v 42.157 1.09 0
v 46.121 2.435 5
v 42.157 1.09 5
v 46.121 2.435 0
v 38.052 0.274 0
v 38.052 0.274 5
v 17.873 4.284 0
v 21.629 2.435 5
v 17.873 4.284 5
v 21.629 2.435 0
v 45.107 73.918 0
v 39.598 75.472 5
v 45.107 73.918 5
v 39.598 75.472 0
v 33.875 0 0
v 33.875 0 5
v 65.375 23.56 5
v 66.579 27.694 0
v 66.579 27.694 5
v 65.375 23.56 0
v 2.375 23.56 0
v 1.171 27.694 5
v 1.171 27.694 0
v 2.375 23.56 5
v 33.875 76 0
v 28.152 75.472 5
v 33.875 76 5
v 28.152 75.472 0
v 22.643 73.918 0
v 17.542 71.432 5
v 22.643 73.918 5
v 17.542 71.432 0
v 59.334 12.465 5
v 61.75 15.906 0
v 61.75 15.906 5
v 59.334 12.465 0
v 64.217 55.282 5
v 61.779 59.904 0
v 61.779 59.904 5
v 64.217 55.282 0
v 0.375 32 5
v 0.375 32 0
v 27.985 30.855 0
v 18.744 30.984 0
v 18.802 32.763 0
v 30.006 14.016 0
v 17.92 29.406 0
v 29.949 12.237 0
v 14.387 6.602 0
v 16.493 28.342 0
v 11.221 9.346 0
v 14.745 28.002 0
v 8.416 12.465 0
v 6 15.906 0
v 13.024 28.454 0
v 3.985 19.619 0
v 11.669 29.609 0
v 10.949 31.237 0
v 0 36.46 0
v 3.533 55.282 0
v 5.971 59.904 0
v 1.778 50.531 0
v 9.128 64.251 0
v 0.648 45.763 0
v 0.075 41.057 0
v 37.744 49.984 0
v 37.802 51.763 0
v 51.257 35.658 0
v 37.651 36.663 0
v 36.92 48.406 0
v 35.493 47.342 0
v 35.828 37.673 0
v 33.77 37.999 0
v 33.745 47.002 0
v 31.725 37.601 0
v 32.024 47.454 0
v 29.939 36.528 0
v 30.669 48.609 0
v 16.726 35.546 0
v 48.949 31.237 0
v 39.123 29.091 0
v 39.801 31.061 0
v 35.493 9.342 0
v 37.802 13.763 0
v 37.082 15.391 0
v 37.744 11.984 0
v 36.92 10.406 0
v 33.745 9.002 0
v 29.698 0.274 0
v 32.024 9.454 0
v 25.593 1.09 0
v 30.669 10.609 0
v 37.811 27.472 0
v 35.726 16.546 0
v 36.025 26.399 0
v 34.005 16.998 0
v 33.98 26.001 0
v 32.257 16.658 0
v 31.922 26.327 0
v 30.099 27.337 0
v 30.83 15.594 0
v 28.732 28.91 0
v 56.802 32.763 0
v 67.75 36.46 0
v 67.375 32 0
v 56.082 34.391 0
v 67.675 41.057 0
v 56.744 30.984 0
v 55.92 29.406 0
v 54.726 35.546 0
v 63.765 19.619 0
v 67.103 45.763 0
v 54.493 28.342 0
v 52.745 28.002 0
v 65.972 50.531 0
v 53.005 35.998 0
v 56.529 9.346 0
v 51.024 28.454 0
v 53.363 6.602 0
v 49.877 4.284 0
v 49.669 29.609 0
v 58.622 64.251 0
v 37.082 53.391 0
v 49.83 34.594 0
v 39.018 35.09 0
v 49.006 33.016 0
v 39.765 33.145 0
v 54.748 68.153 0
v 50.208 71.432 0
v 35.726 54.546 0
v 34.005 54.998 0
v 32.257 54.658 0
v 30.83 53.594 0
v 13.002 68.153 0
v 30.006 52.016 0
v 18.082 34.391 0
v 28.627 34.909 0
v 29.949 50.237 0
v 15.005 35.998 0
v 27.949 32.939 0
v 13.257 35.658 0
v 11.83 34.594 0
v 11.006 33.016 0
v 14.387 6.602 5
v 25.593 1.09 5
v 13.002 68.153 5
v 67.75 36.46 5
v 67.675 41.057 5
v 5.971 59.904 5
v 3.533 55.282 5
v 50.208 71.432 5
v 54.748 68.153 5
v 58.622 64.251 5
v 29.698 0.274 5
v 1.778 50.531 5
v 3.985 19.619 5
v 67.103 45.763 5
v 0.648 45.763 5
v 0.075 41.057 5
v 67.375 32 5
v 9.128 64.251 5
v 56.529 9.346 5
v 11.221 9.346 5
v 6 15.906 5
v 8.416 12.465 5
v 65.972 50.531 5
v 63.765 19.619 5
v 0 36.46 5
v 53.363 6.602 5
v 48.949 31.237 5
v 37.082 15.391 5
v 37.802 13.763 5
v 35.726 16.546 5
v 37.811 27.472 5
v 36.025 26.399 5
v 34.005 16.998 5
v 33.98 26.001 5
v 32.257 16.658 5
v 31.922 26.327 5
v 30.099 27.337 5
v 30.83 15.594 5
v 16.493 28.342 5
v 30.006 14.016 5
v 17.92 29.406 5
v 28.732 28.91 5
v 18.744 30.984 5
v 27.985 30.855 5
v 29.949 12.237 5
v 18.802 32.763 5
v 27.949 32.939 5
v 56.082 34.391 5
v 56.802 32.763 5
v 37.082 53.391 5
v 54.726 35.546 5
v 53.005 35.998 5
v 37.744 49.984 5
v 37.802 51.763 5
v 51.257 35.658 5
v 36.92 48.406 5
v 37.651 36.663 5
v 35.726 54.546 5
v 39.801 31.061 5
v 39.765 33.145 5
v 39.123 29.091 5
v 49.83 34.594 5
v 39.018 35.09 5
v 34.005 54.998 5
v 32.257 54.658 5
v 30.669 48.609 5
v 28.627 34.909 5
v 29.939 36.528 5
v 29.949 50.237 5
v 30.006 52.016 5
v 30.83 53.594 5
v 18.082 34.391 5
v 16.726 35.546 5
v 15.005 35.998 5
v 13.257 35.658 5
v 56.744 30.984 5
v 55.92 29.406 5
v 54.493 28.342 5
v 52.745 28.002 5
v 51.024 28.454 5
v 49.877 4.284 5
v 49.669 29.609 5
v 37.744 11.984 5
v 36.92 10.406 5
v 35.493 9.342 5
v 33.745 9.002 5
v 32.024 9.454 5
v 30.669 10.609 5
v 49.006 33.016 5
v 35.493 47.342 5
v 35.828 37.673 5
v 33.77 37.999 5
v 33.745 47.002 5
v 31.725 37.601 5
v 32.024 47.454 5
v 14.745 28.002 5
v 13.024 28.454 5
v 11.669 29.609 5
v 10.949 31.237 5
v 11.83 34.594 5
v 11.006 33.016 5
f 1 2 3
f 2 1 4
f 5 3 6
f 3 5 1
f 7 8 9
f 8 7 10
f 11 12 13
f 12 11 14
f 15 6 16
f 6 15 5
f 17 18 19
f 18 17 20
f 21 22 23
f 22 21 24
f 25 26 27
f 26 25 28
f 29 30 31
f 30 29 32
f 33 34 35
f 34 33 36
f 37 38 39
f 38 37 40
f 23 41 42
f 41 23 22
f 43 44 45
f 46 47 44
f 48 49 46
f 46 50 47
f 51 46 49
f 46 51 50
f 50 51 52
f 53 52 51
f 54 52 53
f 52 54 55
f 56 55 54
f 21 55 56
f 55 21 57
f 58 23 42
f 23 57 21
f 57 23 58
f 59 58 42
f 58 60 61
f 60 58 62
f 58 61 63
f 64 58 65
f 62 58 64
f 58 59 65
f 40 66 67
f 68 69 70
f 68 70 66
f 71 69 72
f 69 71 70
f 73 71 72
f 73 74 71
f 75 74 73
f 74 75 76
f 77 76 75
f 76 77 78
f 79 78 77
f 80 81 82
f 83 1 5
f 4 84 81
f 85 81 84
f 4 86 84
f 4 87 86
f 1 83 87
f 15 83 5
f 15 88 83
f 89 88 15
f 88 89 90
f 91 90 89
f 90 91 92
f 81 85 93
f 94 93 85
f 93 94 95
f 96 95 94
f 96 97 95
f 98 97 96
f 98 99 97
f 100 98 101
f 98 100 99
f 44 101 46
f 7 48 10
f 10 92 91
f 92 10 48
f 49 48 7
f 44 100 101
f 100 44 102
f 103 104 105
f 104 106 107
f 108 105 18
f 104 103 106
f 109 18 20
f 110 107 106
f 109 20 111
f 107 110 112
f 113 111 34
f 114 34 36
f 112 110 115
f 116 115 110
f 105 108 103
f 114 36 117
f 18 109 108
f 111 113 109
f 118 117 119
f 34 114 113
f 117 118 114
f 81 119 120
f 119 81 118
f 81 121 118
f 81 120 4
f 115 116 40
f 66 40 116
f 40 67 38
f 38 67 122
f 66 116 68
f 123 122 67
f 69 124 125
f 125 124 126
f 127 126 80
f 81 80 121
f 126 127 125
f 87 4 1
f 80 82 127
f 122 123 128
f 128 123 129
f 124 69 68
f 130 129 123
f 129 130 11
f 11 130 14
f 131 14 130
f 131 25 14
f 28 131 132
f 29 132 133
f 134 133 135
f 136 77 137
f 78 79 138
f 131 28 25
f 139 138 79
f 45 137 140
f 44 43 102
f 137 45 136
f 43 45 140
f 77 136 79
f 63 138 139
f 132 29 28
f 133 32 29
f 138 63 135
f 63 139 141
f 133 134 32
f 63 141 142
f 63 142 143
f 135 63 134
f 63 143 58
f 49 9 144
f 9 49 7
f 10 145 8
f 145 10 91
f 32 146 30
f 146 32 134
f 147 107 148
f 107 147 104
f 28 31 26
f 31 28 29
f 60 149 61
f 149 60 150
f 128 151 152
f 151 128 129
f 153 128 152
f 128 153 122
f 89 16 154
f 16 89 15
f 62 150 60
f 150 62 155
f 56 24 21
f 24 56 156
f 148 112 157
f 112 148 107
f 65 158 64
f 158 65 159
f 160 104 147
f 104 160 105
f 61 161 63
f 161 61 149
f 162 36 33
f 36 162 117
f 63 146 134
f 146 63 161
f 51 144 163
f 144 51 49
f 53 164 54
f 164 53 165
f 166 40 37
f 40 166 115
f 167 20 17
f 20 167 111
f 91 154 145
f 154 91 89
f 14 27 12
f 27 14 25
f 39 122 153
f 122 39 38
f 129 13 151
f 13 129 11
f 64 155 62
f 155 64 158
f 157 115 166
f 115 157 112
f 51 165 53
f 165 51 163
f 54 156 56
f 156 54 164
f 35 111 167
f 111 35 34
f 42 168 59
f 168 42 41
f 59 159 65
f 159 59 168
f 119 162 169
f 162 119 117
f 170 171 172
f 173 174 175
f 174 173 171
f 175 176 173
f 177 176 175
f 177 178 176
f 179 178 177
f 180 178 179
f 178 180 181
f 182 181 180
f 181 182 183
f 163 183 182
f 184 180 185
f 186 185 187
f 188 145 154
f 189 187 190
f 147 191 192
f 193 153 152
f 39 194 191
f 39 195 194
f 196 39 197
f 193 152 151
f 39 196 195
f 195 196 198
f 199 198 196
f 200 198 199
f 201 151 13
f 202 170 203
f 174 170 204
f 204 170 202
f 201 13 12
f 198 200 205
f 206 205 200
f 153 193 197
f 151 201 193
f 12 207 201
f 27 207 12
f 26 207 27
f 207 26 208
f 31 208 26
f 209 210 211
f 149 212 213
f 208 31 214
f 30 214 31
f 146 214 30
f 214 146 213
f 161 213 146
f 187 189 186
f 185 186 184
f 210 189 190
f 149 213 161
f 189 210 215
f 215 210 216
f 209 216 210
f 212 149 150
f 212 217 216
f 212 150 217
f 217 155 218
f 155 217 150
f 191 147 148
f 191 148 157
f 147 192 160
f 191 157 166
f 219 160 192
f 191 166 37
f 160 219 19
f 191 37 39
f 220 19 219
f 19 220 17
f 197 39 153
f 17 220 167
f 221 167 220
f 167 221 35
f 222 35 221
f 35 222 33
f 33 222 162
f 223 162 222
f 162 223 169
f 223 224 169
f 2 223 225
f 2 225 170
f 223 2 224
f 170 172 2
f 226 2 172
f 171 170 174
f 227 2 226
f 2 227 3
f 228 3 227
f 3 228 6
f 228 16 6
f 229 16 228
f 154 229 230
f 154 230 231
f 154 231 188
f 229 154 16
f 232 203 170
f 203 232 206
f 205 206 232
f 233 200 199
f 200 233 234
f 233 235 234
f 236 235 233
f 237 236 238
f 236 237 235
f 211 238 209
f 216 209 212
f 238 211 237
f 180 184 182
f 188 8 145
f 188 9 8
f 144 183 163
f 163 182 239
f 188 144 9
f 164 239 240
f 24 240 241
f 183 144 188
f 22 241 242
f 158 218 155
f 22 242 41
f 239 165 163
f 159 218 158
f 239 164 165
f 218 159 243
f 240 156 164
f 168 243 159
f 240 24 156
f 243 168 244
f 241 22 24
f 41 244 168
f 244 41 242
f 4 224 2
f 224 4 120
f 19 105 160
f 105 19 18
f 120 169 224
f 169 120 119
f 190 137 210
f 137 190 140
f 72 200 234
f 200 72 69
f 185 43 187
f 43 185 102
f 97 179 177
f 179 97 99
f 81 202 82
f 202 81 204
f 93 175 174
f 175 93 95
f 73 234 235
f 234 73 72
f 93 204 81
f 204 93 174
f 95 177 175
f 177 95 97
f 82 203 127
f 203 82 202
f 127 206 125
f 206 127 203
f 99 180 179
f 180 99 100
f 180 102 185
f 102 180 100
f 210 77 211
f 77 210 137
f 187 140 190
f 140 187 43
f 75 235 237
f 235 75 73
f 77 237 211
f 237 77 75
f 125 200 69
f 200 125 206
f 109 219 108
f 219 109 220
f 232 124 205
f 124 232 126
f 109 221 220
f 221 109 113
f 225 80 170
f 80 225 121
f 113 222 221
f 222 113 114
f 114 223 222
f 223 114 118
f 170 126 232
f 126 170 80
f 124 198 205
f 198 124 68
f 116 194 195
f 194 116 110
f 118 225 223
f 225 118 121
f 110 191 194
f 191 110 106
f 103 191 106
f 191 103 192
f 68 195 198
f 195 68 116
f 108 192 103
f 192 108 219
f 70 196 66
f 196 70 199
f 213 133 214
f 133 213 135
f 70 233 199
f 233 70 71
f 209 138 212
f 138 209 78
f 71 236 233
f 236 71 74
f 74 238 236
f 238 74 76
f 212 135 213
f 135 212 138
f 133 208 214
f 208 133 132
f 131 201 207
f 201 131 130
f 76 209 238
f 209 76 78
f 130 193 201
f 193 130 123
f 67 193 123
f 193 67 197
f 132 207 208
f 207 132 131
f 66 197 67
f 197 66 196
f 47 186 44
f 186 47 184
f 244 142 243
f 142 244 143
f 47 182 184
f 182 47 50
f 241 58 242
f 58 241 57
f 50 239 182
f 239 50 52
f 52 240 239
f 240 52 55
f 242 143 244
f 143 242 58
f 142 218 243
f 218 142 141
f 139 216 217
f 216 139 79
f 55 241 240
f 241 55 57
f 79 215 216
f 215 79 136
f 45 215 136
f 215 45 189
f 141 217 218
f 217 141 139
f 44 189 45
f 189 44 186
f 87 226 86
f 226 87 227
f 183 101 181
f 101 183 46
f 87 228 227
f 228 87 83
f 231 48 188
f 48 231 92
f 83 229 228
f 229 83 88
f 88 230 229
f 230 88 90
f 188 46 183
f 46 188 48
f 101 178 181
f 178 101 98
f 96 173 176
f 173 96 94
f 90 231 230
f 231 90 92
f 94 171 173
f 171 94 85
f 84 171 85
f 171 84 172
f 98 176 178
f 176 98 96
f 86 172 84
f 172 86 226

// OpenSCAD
$fn = 32;

// ----------------------------------------------------------------------
// Cam plate: single_lobe cam, base R32
// ----------------------------------------------------------------------

// --- parameters (mm) ---
base_r = 32;              // base circle radius
lobe_h = 12;              // cam lobe rise
bore_r = 6;               // shaft bore radius
plate_t = 5;              // plate thickness, Z (extrusion height)
ring_r = 19;              // lightening ring radius
bolt_r = 4;               // lightening hole radius
fit_tol = 0.02;           // declared fit tolerance (prompt contract)
free_tol = 0.2;           // declared free tolerance (prompt contract)

profile = [[67.375, 32], [67.75, 36.46], [67.675, 41.057], [67.103, 45.763], [65.972, 50.531], [64.217, 55.282], [61.779, 59.904], [58.622, 64.251], [54.748, 68.153], [50.208, 71.432], [45.107, 73.918], [39.598, 75.472], [33.875, 76], [28.152, 75.472], [22.643, 73.918], [17.542, 71.432], [13.002, 68.153], [9.128, 64.251], [5.971, 59.904], [3.533, 55.282], [1.778, 50.531], [0.648, 45.763], [0.075, 41.057], [0, 36.46], [0.375, 32], [1.171, 27.694], [2.375, 23.56], [3.985, 19.619], [6, 15.906], [8.416, 12.465], [11.221, 9.346], [14.387, 6.602], [17.873, 4.284], [21.629, 2.435], [25.593, 1.09], [29.698, 0.274], [33.875, 0], [38.052, 0.274], [42.157, 1.09], [46.121, 2.435], [49.877, 4.284], [53.363, 6.602], [56.529, 9.346], [59.334, 12.465], [61.75, 15.906], [63.765, 19.619], [65.375, 23.56], [66.579, 27.694]];  // primary outline, 48 points, counter clockwise
void_1 = [[39.765, 33.145], [39.018, 35.09], [37.651, 36.663], [35.828, 37.673], [33.77, 37.999], [31.725, 37.601], [29.939, 36.528], [28.627, 34.909], [27.949, 32.939], [27.985, 30.855], [28.732, 28.91], [30.099, 27.337], [31.922, 26.327], [33.98, 26.001], [36.025, 26.399], [37.811, 27.472], [39.123, 29.091], [39.801, 31.061]];  // shaft bore, 18 points
void_2 = [[56.802, 32.763], [56.082, 34.391], [54.726, 35.546], [53.005, 35.998], [51.257, 35.658], [49.83, 34.594], [49.006, 33.016], [48.949, 31.237], [49.669, 29.609], [51.024, 28.454], [52.745, 28.002], [54.493, 28.342], [55.92, 29.406], [56.744, 30.984]];  // lightening hole 1, 14 points
void_3 = [[37.802, 51.763], [37.082, 53.391], [35.726, 54.546], [34.005, 54.998], [32.257, 54.658], [30.83, 53.594], [30.006, 52.016], [29.949, 50.237], [30.669, 48.609], [32.024, 47.454], [33.745, 47.002], [35.493, 47.342], [36.92, 48.406], [37.744, 49.984]];  // lightening hole 2, 14 points
void_4 = [[18.802, 32.763], [18.082, 34.391], [16.726, 35.546], [15.005, 35.998], [13.257, 35.658], [11.83, 34.594], [11.006, 33.016], [10.949, 31.237], [11.669, 29.609], [13.024, 28.454], [14.745, 28.002], [16.493, 28.342], [17.92, 29.406], [18.744, 30.984]];  // lightening hole 3, 14 points
void_5 = [[37.802, 13.763], [37.082, 15.391], [35.726, 16.546], [34.005, 16.998], [32.257, 16.658], [30.83, 15.594], [30.006, 14.016], [29.949, 12.237], [30.669, 10.609], [32.024, 9.454], [33.745, 9.002], [35.493, 9.342], [36.92, 10.406], [37.744, 11.984]];  // lightening hole 4, 14 points

// --- the one profile operation ---
difference() {
  linear_extrude(height = plate_t) polygon(points = profile);
  translate([0, 0, -1])
    linear_extrude(height = plate_t + 2) polygon(points = void_1);
  translate([0, 0, -1])
    linear_extrude(height = plate_t + 2) polygon(points = void_2);
  translate([0, 0, -1])
    linear_extrude(height = plate_t + 2) polygon(points = void_3);
  translate([0, 0, -1])
    linear_extrude(height = plate_t + 2) polygon(points = void_4);
  translate([0, 0, -1])
    linear_extrude(height = plate_t + 2) polygon(points = void_5);
}
